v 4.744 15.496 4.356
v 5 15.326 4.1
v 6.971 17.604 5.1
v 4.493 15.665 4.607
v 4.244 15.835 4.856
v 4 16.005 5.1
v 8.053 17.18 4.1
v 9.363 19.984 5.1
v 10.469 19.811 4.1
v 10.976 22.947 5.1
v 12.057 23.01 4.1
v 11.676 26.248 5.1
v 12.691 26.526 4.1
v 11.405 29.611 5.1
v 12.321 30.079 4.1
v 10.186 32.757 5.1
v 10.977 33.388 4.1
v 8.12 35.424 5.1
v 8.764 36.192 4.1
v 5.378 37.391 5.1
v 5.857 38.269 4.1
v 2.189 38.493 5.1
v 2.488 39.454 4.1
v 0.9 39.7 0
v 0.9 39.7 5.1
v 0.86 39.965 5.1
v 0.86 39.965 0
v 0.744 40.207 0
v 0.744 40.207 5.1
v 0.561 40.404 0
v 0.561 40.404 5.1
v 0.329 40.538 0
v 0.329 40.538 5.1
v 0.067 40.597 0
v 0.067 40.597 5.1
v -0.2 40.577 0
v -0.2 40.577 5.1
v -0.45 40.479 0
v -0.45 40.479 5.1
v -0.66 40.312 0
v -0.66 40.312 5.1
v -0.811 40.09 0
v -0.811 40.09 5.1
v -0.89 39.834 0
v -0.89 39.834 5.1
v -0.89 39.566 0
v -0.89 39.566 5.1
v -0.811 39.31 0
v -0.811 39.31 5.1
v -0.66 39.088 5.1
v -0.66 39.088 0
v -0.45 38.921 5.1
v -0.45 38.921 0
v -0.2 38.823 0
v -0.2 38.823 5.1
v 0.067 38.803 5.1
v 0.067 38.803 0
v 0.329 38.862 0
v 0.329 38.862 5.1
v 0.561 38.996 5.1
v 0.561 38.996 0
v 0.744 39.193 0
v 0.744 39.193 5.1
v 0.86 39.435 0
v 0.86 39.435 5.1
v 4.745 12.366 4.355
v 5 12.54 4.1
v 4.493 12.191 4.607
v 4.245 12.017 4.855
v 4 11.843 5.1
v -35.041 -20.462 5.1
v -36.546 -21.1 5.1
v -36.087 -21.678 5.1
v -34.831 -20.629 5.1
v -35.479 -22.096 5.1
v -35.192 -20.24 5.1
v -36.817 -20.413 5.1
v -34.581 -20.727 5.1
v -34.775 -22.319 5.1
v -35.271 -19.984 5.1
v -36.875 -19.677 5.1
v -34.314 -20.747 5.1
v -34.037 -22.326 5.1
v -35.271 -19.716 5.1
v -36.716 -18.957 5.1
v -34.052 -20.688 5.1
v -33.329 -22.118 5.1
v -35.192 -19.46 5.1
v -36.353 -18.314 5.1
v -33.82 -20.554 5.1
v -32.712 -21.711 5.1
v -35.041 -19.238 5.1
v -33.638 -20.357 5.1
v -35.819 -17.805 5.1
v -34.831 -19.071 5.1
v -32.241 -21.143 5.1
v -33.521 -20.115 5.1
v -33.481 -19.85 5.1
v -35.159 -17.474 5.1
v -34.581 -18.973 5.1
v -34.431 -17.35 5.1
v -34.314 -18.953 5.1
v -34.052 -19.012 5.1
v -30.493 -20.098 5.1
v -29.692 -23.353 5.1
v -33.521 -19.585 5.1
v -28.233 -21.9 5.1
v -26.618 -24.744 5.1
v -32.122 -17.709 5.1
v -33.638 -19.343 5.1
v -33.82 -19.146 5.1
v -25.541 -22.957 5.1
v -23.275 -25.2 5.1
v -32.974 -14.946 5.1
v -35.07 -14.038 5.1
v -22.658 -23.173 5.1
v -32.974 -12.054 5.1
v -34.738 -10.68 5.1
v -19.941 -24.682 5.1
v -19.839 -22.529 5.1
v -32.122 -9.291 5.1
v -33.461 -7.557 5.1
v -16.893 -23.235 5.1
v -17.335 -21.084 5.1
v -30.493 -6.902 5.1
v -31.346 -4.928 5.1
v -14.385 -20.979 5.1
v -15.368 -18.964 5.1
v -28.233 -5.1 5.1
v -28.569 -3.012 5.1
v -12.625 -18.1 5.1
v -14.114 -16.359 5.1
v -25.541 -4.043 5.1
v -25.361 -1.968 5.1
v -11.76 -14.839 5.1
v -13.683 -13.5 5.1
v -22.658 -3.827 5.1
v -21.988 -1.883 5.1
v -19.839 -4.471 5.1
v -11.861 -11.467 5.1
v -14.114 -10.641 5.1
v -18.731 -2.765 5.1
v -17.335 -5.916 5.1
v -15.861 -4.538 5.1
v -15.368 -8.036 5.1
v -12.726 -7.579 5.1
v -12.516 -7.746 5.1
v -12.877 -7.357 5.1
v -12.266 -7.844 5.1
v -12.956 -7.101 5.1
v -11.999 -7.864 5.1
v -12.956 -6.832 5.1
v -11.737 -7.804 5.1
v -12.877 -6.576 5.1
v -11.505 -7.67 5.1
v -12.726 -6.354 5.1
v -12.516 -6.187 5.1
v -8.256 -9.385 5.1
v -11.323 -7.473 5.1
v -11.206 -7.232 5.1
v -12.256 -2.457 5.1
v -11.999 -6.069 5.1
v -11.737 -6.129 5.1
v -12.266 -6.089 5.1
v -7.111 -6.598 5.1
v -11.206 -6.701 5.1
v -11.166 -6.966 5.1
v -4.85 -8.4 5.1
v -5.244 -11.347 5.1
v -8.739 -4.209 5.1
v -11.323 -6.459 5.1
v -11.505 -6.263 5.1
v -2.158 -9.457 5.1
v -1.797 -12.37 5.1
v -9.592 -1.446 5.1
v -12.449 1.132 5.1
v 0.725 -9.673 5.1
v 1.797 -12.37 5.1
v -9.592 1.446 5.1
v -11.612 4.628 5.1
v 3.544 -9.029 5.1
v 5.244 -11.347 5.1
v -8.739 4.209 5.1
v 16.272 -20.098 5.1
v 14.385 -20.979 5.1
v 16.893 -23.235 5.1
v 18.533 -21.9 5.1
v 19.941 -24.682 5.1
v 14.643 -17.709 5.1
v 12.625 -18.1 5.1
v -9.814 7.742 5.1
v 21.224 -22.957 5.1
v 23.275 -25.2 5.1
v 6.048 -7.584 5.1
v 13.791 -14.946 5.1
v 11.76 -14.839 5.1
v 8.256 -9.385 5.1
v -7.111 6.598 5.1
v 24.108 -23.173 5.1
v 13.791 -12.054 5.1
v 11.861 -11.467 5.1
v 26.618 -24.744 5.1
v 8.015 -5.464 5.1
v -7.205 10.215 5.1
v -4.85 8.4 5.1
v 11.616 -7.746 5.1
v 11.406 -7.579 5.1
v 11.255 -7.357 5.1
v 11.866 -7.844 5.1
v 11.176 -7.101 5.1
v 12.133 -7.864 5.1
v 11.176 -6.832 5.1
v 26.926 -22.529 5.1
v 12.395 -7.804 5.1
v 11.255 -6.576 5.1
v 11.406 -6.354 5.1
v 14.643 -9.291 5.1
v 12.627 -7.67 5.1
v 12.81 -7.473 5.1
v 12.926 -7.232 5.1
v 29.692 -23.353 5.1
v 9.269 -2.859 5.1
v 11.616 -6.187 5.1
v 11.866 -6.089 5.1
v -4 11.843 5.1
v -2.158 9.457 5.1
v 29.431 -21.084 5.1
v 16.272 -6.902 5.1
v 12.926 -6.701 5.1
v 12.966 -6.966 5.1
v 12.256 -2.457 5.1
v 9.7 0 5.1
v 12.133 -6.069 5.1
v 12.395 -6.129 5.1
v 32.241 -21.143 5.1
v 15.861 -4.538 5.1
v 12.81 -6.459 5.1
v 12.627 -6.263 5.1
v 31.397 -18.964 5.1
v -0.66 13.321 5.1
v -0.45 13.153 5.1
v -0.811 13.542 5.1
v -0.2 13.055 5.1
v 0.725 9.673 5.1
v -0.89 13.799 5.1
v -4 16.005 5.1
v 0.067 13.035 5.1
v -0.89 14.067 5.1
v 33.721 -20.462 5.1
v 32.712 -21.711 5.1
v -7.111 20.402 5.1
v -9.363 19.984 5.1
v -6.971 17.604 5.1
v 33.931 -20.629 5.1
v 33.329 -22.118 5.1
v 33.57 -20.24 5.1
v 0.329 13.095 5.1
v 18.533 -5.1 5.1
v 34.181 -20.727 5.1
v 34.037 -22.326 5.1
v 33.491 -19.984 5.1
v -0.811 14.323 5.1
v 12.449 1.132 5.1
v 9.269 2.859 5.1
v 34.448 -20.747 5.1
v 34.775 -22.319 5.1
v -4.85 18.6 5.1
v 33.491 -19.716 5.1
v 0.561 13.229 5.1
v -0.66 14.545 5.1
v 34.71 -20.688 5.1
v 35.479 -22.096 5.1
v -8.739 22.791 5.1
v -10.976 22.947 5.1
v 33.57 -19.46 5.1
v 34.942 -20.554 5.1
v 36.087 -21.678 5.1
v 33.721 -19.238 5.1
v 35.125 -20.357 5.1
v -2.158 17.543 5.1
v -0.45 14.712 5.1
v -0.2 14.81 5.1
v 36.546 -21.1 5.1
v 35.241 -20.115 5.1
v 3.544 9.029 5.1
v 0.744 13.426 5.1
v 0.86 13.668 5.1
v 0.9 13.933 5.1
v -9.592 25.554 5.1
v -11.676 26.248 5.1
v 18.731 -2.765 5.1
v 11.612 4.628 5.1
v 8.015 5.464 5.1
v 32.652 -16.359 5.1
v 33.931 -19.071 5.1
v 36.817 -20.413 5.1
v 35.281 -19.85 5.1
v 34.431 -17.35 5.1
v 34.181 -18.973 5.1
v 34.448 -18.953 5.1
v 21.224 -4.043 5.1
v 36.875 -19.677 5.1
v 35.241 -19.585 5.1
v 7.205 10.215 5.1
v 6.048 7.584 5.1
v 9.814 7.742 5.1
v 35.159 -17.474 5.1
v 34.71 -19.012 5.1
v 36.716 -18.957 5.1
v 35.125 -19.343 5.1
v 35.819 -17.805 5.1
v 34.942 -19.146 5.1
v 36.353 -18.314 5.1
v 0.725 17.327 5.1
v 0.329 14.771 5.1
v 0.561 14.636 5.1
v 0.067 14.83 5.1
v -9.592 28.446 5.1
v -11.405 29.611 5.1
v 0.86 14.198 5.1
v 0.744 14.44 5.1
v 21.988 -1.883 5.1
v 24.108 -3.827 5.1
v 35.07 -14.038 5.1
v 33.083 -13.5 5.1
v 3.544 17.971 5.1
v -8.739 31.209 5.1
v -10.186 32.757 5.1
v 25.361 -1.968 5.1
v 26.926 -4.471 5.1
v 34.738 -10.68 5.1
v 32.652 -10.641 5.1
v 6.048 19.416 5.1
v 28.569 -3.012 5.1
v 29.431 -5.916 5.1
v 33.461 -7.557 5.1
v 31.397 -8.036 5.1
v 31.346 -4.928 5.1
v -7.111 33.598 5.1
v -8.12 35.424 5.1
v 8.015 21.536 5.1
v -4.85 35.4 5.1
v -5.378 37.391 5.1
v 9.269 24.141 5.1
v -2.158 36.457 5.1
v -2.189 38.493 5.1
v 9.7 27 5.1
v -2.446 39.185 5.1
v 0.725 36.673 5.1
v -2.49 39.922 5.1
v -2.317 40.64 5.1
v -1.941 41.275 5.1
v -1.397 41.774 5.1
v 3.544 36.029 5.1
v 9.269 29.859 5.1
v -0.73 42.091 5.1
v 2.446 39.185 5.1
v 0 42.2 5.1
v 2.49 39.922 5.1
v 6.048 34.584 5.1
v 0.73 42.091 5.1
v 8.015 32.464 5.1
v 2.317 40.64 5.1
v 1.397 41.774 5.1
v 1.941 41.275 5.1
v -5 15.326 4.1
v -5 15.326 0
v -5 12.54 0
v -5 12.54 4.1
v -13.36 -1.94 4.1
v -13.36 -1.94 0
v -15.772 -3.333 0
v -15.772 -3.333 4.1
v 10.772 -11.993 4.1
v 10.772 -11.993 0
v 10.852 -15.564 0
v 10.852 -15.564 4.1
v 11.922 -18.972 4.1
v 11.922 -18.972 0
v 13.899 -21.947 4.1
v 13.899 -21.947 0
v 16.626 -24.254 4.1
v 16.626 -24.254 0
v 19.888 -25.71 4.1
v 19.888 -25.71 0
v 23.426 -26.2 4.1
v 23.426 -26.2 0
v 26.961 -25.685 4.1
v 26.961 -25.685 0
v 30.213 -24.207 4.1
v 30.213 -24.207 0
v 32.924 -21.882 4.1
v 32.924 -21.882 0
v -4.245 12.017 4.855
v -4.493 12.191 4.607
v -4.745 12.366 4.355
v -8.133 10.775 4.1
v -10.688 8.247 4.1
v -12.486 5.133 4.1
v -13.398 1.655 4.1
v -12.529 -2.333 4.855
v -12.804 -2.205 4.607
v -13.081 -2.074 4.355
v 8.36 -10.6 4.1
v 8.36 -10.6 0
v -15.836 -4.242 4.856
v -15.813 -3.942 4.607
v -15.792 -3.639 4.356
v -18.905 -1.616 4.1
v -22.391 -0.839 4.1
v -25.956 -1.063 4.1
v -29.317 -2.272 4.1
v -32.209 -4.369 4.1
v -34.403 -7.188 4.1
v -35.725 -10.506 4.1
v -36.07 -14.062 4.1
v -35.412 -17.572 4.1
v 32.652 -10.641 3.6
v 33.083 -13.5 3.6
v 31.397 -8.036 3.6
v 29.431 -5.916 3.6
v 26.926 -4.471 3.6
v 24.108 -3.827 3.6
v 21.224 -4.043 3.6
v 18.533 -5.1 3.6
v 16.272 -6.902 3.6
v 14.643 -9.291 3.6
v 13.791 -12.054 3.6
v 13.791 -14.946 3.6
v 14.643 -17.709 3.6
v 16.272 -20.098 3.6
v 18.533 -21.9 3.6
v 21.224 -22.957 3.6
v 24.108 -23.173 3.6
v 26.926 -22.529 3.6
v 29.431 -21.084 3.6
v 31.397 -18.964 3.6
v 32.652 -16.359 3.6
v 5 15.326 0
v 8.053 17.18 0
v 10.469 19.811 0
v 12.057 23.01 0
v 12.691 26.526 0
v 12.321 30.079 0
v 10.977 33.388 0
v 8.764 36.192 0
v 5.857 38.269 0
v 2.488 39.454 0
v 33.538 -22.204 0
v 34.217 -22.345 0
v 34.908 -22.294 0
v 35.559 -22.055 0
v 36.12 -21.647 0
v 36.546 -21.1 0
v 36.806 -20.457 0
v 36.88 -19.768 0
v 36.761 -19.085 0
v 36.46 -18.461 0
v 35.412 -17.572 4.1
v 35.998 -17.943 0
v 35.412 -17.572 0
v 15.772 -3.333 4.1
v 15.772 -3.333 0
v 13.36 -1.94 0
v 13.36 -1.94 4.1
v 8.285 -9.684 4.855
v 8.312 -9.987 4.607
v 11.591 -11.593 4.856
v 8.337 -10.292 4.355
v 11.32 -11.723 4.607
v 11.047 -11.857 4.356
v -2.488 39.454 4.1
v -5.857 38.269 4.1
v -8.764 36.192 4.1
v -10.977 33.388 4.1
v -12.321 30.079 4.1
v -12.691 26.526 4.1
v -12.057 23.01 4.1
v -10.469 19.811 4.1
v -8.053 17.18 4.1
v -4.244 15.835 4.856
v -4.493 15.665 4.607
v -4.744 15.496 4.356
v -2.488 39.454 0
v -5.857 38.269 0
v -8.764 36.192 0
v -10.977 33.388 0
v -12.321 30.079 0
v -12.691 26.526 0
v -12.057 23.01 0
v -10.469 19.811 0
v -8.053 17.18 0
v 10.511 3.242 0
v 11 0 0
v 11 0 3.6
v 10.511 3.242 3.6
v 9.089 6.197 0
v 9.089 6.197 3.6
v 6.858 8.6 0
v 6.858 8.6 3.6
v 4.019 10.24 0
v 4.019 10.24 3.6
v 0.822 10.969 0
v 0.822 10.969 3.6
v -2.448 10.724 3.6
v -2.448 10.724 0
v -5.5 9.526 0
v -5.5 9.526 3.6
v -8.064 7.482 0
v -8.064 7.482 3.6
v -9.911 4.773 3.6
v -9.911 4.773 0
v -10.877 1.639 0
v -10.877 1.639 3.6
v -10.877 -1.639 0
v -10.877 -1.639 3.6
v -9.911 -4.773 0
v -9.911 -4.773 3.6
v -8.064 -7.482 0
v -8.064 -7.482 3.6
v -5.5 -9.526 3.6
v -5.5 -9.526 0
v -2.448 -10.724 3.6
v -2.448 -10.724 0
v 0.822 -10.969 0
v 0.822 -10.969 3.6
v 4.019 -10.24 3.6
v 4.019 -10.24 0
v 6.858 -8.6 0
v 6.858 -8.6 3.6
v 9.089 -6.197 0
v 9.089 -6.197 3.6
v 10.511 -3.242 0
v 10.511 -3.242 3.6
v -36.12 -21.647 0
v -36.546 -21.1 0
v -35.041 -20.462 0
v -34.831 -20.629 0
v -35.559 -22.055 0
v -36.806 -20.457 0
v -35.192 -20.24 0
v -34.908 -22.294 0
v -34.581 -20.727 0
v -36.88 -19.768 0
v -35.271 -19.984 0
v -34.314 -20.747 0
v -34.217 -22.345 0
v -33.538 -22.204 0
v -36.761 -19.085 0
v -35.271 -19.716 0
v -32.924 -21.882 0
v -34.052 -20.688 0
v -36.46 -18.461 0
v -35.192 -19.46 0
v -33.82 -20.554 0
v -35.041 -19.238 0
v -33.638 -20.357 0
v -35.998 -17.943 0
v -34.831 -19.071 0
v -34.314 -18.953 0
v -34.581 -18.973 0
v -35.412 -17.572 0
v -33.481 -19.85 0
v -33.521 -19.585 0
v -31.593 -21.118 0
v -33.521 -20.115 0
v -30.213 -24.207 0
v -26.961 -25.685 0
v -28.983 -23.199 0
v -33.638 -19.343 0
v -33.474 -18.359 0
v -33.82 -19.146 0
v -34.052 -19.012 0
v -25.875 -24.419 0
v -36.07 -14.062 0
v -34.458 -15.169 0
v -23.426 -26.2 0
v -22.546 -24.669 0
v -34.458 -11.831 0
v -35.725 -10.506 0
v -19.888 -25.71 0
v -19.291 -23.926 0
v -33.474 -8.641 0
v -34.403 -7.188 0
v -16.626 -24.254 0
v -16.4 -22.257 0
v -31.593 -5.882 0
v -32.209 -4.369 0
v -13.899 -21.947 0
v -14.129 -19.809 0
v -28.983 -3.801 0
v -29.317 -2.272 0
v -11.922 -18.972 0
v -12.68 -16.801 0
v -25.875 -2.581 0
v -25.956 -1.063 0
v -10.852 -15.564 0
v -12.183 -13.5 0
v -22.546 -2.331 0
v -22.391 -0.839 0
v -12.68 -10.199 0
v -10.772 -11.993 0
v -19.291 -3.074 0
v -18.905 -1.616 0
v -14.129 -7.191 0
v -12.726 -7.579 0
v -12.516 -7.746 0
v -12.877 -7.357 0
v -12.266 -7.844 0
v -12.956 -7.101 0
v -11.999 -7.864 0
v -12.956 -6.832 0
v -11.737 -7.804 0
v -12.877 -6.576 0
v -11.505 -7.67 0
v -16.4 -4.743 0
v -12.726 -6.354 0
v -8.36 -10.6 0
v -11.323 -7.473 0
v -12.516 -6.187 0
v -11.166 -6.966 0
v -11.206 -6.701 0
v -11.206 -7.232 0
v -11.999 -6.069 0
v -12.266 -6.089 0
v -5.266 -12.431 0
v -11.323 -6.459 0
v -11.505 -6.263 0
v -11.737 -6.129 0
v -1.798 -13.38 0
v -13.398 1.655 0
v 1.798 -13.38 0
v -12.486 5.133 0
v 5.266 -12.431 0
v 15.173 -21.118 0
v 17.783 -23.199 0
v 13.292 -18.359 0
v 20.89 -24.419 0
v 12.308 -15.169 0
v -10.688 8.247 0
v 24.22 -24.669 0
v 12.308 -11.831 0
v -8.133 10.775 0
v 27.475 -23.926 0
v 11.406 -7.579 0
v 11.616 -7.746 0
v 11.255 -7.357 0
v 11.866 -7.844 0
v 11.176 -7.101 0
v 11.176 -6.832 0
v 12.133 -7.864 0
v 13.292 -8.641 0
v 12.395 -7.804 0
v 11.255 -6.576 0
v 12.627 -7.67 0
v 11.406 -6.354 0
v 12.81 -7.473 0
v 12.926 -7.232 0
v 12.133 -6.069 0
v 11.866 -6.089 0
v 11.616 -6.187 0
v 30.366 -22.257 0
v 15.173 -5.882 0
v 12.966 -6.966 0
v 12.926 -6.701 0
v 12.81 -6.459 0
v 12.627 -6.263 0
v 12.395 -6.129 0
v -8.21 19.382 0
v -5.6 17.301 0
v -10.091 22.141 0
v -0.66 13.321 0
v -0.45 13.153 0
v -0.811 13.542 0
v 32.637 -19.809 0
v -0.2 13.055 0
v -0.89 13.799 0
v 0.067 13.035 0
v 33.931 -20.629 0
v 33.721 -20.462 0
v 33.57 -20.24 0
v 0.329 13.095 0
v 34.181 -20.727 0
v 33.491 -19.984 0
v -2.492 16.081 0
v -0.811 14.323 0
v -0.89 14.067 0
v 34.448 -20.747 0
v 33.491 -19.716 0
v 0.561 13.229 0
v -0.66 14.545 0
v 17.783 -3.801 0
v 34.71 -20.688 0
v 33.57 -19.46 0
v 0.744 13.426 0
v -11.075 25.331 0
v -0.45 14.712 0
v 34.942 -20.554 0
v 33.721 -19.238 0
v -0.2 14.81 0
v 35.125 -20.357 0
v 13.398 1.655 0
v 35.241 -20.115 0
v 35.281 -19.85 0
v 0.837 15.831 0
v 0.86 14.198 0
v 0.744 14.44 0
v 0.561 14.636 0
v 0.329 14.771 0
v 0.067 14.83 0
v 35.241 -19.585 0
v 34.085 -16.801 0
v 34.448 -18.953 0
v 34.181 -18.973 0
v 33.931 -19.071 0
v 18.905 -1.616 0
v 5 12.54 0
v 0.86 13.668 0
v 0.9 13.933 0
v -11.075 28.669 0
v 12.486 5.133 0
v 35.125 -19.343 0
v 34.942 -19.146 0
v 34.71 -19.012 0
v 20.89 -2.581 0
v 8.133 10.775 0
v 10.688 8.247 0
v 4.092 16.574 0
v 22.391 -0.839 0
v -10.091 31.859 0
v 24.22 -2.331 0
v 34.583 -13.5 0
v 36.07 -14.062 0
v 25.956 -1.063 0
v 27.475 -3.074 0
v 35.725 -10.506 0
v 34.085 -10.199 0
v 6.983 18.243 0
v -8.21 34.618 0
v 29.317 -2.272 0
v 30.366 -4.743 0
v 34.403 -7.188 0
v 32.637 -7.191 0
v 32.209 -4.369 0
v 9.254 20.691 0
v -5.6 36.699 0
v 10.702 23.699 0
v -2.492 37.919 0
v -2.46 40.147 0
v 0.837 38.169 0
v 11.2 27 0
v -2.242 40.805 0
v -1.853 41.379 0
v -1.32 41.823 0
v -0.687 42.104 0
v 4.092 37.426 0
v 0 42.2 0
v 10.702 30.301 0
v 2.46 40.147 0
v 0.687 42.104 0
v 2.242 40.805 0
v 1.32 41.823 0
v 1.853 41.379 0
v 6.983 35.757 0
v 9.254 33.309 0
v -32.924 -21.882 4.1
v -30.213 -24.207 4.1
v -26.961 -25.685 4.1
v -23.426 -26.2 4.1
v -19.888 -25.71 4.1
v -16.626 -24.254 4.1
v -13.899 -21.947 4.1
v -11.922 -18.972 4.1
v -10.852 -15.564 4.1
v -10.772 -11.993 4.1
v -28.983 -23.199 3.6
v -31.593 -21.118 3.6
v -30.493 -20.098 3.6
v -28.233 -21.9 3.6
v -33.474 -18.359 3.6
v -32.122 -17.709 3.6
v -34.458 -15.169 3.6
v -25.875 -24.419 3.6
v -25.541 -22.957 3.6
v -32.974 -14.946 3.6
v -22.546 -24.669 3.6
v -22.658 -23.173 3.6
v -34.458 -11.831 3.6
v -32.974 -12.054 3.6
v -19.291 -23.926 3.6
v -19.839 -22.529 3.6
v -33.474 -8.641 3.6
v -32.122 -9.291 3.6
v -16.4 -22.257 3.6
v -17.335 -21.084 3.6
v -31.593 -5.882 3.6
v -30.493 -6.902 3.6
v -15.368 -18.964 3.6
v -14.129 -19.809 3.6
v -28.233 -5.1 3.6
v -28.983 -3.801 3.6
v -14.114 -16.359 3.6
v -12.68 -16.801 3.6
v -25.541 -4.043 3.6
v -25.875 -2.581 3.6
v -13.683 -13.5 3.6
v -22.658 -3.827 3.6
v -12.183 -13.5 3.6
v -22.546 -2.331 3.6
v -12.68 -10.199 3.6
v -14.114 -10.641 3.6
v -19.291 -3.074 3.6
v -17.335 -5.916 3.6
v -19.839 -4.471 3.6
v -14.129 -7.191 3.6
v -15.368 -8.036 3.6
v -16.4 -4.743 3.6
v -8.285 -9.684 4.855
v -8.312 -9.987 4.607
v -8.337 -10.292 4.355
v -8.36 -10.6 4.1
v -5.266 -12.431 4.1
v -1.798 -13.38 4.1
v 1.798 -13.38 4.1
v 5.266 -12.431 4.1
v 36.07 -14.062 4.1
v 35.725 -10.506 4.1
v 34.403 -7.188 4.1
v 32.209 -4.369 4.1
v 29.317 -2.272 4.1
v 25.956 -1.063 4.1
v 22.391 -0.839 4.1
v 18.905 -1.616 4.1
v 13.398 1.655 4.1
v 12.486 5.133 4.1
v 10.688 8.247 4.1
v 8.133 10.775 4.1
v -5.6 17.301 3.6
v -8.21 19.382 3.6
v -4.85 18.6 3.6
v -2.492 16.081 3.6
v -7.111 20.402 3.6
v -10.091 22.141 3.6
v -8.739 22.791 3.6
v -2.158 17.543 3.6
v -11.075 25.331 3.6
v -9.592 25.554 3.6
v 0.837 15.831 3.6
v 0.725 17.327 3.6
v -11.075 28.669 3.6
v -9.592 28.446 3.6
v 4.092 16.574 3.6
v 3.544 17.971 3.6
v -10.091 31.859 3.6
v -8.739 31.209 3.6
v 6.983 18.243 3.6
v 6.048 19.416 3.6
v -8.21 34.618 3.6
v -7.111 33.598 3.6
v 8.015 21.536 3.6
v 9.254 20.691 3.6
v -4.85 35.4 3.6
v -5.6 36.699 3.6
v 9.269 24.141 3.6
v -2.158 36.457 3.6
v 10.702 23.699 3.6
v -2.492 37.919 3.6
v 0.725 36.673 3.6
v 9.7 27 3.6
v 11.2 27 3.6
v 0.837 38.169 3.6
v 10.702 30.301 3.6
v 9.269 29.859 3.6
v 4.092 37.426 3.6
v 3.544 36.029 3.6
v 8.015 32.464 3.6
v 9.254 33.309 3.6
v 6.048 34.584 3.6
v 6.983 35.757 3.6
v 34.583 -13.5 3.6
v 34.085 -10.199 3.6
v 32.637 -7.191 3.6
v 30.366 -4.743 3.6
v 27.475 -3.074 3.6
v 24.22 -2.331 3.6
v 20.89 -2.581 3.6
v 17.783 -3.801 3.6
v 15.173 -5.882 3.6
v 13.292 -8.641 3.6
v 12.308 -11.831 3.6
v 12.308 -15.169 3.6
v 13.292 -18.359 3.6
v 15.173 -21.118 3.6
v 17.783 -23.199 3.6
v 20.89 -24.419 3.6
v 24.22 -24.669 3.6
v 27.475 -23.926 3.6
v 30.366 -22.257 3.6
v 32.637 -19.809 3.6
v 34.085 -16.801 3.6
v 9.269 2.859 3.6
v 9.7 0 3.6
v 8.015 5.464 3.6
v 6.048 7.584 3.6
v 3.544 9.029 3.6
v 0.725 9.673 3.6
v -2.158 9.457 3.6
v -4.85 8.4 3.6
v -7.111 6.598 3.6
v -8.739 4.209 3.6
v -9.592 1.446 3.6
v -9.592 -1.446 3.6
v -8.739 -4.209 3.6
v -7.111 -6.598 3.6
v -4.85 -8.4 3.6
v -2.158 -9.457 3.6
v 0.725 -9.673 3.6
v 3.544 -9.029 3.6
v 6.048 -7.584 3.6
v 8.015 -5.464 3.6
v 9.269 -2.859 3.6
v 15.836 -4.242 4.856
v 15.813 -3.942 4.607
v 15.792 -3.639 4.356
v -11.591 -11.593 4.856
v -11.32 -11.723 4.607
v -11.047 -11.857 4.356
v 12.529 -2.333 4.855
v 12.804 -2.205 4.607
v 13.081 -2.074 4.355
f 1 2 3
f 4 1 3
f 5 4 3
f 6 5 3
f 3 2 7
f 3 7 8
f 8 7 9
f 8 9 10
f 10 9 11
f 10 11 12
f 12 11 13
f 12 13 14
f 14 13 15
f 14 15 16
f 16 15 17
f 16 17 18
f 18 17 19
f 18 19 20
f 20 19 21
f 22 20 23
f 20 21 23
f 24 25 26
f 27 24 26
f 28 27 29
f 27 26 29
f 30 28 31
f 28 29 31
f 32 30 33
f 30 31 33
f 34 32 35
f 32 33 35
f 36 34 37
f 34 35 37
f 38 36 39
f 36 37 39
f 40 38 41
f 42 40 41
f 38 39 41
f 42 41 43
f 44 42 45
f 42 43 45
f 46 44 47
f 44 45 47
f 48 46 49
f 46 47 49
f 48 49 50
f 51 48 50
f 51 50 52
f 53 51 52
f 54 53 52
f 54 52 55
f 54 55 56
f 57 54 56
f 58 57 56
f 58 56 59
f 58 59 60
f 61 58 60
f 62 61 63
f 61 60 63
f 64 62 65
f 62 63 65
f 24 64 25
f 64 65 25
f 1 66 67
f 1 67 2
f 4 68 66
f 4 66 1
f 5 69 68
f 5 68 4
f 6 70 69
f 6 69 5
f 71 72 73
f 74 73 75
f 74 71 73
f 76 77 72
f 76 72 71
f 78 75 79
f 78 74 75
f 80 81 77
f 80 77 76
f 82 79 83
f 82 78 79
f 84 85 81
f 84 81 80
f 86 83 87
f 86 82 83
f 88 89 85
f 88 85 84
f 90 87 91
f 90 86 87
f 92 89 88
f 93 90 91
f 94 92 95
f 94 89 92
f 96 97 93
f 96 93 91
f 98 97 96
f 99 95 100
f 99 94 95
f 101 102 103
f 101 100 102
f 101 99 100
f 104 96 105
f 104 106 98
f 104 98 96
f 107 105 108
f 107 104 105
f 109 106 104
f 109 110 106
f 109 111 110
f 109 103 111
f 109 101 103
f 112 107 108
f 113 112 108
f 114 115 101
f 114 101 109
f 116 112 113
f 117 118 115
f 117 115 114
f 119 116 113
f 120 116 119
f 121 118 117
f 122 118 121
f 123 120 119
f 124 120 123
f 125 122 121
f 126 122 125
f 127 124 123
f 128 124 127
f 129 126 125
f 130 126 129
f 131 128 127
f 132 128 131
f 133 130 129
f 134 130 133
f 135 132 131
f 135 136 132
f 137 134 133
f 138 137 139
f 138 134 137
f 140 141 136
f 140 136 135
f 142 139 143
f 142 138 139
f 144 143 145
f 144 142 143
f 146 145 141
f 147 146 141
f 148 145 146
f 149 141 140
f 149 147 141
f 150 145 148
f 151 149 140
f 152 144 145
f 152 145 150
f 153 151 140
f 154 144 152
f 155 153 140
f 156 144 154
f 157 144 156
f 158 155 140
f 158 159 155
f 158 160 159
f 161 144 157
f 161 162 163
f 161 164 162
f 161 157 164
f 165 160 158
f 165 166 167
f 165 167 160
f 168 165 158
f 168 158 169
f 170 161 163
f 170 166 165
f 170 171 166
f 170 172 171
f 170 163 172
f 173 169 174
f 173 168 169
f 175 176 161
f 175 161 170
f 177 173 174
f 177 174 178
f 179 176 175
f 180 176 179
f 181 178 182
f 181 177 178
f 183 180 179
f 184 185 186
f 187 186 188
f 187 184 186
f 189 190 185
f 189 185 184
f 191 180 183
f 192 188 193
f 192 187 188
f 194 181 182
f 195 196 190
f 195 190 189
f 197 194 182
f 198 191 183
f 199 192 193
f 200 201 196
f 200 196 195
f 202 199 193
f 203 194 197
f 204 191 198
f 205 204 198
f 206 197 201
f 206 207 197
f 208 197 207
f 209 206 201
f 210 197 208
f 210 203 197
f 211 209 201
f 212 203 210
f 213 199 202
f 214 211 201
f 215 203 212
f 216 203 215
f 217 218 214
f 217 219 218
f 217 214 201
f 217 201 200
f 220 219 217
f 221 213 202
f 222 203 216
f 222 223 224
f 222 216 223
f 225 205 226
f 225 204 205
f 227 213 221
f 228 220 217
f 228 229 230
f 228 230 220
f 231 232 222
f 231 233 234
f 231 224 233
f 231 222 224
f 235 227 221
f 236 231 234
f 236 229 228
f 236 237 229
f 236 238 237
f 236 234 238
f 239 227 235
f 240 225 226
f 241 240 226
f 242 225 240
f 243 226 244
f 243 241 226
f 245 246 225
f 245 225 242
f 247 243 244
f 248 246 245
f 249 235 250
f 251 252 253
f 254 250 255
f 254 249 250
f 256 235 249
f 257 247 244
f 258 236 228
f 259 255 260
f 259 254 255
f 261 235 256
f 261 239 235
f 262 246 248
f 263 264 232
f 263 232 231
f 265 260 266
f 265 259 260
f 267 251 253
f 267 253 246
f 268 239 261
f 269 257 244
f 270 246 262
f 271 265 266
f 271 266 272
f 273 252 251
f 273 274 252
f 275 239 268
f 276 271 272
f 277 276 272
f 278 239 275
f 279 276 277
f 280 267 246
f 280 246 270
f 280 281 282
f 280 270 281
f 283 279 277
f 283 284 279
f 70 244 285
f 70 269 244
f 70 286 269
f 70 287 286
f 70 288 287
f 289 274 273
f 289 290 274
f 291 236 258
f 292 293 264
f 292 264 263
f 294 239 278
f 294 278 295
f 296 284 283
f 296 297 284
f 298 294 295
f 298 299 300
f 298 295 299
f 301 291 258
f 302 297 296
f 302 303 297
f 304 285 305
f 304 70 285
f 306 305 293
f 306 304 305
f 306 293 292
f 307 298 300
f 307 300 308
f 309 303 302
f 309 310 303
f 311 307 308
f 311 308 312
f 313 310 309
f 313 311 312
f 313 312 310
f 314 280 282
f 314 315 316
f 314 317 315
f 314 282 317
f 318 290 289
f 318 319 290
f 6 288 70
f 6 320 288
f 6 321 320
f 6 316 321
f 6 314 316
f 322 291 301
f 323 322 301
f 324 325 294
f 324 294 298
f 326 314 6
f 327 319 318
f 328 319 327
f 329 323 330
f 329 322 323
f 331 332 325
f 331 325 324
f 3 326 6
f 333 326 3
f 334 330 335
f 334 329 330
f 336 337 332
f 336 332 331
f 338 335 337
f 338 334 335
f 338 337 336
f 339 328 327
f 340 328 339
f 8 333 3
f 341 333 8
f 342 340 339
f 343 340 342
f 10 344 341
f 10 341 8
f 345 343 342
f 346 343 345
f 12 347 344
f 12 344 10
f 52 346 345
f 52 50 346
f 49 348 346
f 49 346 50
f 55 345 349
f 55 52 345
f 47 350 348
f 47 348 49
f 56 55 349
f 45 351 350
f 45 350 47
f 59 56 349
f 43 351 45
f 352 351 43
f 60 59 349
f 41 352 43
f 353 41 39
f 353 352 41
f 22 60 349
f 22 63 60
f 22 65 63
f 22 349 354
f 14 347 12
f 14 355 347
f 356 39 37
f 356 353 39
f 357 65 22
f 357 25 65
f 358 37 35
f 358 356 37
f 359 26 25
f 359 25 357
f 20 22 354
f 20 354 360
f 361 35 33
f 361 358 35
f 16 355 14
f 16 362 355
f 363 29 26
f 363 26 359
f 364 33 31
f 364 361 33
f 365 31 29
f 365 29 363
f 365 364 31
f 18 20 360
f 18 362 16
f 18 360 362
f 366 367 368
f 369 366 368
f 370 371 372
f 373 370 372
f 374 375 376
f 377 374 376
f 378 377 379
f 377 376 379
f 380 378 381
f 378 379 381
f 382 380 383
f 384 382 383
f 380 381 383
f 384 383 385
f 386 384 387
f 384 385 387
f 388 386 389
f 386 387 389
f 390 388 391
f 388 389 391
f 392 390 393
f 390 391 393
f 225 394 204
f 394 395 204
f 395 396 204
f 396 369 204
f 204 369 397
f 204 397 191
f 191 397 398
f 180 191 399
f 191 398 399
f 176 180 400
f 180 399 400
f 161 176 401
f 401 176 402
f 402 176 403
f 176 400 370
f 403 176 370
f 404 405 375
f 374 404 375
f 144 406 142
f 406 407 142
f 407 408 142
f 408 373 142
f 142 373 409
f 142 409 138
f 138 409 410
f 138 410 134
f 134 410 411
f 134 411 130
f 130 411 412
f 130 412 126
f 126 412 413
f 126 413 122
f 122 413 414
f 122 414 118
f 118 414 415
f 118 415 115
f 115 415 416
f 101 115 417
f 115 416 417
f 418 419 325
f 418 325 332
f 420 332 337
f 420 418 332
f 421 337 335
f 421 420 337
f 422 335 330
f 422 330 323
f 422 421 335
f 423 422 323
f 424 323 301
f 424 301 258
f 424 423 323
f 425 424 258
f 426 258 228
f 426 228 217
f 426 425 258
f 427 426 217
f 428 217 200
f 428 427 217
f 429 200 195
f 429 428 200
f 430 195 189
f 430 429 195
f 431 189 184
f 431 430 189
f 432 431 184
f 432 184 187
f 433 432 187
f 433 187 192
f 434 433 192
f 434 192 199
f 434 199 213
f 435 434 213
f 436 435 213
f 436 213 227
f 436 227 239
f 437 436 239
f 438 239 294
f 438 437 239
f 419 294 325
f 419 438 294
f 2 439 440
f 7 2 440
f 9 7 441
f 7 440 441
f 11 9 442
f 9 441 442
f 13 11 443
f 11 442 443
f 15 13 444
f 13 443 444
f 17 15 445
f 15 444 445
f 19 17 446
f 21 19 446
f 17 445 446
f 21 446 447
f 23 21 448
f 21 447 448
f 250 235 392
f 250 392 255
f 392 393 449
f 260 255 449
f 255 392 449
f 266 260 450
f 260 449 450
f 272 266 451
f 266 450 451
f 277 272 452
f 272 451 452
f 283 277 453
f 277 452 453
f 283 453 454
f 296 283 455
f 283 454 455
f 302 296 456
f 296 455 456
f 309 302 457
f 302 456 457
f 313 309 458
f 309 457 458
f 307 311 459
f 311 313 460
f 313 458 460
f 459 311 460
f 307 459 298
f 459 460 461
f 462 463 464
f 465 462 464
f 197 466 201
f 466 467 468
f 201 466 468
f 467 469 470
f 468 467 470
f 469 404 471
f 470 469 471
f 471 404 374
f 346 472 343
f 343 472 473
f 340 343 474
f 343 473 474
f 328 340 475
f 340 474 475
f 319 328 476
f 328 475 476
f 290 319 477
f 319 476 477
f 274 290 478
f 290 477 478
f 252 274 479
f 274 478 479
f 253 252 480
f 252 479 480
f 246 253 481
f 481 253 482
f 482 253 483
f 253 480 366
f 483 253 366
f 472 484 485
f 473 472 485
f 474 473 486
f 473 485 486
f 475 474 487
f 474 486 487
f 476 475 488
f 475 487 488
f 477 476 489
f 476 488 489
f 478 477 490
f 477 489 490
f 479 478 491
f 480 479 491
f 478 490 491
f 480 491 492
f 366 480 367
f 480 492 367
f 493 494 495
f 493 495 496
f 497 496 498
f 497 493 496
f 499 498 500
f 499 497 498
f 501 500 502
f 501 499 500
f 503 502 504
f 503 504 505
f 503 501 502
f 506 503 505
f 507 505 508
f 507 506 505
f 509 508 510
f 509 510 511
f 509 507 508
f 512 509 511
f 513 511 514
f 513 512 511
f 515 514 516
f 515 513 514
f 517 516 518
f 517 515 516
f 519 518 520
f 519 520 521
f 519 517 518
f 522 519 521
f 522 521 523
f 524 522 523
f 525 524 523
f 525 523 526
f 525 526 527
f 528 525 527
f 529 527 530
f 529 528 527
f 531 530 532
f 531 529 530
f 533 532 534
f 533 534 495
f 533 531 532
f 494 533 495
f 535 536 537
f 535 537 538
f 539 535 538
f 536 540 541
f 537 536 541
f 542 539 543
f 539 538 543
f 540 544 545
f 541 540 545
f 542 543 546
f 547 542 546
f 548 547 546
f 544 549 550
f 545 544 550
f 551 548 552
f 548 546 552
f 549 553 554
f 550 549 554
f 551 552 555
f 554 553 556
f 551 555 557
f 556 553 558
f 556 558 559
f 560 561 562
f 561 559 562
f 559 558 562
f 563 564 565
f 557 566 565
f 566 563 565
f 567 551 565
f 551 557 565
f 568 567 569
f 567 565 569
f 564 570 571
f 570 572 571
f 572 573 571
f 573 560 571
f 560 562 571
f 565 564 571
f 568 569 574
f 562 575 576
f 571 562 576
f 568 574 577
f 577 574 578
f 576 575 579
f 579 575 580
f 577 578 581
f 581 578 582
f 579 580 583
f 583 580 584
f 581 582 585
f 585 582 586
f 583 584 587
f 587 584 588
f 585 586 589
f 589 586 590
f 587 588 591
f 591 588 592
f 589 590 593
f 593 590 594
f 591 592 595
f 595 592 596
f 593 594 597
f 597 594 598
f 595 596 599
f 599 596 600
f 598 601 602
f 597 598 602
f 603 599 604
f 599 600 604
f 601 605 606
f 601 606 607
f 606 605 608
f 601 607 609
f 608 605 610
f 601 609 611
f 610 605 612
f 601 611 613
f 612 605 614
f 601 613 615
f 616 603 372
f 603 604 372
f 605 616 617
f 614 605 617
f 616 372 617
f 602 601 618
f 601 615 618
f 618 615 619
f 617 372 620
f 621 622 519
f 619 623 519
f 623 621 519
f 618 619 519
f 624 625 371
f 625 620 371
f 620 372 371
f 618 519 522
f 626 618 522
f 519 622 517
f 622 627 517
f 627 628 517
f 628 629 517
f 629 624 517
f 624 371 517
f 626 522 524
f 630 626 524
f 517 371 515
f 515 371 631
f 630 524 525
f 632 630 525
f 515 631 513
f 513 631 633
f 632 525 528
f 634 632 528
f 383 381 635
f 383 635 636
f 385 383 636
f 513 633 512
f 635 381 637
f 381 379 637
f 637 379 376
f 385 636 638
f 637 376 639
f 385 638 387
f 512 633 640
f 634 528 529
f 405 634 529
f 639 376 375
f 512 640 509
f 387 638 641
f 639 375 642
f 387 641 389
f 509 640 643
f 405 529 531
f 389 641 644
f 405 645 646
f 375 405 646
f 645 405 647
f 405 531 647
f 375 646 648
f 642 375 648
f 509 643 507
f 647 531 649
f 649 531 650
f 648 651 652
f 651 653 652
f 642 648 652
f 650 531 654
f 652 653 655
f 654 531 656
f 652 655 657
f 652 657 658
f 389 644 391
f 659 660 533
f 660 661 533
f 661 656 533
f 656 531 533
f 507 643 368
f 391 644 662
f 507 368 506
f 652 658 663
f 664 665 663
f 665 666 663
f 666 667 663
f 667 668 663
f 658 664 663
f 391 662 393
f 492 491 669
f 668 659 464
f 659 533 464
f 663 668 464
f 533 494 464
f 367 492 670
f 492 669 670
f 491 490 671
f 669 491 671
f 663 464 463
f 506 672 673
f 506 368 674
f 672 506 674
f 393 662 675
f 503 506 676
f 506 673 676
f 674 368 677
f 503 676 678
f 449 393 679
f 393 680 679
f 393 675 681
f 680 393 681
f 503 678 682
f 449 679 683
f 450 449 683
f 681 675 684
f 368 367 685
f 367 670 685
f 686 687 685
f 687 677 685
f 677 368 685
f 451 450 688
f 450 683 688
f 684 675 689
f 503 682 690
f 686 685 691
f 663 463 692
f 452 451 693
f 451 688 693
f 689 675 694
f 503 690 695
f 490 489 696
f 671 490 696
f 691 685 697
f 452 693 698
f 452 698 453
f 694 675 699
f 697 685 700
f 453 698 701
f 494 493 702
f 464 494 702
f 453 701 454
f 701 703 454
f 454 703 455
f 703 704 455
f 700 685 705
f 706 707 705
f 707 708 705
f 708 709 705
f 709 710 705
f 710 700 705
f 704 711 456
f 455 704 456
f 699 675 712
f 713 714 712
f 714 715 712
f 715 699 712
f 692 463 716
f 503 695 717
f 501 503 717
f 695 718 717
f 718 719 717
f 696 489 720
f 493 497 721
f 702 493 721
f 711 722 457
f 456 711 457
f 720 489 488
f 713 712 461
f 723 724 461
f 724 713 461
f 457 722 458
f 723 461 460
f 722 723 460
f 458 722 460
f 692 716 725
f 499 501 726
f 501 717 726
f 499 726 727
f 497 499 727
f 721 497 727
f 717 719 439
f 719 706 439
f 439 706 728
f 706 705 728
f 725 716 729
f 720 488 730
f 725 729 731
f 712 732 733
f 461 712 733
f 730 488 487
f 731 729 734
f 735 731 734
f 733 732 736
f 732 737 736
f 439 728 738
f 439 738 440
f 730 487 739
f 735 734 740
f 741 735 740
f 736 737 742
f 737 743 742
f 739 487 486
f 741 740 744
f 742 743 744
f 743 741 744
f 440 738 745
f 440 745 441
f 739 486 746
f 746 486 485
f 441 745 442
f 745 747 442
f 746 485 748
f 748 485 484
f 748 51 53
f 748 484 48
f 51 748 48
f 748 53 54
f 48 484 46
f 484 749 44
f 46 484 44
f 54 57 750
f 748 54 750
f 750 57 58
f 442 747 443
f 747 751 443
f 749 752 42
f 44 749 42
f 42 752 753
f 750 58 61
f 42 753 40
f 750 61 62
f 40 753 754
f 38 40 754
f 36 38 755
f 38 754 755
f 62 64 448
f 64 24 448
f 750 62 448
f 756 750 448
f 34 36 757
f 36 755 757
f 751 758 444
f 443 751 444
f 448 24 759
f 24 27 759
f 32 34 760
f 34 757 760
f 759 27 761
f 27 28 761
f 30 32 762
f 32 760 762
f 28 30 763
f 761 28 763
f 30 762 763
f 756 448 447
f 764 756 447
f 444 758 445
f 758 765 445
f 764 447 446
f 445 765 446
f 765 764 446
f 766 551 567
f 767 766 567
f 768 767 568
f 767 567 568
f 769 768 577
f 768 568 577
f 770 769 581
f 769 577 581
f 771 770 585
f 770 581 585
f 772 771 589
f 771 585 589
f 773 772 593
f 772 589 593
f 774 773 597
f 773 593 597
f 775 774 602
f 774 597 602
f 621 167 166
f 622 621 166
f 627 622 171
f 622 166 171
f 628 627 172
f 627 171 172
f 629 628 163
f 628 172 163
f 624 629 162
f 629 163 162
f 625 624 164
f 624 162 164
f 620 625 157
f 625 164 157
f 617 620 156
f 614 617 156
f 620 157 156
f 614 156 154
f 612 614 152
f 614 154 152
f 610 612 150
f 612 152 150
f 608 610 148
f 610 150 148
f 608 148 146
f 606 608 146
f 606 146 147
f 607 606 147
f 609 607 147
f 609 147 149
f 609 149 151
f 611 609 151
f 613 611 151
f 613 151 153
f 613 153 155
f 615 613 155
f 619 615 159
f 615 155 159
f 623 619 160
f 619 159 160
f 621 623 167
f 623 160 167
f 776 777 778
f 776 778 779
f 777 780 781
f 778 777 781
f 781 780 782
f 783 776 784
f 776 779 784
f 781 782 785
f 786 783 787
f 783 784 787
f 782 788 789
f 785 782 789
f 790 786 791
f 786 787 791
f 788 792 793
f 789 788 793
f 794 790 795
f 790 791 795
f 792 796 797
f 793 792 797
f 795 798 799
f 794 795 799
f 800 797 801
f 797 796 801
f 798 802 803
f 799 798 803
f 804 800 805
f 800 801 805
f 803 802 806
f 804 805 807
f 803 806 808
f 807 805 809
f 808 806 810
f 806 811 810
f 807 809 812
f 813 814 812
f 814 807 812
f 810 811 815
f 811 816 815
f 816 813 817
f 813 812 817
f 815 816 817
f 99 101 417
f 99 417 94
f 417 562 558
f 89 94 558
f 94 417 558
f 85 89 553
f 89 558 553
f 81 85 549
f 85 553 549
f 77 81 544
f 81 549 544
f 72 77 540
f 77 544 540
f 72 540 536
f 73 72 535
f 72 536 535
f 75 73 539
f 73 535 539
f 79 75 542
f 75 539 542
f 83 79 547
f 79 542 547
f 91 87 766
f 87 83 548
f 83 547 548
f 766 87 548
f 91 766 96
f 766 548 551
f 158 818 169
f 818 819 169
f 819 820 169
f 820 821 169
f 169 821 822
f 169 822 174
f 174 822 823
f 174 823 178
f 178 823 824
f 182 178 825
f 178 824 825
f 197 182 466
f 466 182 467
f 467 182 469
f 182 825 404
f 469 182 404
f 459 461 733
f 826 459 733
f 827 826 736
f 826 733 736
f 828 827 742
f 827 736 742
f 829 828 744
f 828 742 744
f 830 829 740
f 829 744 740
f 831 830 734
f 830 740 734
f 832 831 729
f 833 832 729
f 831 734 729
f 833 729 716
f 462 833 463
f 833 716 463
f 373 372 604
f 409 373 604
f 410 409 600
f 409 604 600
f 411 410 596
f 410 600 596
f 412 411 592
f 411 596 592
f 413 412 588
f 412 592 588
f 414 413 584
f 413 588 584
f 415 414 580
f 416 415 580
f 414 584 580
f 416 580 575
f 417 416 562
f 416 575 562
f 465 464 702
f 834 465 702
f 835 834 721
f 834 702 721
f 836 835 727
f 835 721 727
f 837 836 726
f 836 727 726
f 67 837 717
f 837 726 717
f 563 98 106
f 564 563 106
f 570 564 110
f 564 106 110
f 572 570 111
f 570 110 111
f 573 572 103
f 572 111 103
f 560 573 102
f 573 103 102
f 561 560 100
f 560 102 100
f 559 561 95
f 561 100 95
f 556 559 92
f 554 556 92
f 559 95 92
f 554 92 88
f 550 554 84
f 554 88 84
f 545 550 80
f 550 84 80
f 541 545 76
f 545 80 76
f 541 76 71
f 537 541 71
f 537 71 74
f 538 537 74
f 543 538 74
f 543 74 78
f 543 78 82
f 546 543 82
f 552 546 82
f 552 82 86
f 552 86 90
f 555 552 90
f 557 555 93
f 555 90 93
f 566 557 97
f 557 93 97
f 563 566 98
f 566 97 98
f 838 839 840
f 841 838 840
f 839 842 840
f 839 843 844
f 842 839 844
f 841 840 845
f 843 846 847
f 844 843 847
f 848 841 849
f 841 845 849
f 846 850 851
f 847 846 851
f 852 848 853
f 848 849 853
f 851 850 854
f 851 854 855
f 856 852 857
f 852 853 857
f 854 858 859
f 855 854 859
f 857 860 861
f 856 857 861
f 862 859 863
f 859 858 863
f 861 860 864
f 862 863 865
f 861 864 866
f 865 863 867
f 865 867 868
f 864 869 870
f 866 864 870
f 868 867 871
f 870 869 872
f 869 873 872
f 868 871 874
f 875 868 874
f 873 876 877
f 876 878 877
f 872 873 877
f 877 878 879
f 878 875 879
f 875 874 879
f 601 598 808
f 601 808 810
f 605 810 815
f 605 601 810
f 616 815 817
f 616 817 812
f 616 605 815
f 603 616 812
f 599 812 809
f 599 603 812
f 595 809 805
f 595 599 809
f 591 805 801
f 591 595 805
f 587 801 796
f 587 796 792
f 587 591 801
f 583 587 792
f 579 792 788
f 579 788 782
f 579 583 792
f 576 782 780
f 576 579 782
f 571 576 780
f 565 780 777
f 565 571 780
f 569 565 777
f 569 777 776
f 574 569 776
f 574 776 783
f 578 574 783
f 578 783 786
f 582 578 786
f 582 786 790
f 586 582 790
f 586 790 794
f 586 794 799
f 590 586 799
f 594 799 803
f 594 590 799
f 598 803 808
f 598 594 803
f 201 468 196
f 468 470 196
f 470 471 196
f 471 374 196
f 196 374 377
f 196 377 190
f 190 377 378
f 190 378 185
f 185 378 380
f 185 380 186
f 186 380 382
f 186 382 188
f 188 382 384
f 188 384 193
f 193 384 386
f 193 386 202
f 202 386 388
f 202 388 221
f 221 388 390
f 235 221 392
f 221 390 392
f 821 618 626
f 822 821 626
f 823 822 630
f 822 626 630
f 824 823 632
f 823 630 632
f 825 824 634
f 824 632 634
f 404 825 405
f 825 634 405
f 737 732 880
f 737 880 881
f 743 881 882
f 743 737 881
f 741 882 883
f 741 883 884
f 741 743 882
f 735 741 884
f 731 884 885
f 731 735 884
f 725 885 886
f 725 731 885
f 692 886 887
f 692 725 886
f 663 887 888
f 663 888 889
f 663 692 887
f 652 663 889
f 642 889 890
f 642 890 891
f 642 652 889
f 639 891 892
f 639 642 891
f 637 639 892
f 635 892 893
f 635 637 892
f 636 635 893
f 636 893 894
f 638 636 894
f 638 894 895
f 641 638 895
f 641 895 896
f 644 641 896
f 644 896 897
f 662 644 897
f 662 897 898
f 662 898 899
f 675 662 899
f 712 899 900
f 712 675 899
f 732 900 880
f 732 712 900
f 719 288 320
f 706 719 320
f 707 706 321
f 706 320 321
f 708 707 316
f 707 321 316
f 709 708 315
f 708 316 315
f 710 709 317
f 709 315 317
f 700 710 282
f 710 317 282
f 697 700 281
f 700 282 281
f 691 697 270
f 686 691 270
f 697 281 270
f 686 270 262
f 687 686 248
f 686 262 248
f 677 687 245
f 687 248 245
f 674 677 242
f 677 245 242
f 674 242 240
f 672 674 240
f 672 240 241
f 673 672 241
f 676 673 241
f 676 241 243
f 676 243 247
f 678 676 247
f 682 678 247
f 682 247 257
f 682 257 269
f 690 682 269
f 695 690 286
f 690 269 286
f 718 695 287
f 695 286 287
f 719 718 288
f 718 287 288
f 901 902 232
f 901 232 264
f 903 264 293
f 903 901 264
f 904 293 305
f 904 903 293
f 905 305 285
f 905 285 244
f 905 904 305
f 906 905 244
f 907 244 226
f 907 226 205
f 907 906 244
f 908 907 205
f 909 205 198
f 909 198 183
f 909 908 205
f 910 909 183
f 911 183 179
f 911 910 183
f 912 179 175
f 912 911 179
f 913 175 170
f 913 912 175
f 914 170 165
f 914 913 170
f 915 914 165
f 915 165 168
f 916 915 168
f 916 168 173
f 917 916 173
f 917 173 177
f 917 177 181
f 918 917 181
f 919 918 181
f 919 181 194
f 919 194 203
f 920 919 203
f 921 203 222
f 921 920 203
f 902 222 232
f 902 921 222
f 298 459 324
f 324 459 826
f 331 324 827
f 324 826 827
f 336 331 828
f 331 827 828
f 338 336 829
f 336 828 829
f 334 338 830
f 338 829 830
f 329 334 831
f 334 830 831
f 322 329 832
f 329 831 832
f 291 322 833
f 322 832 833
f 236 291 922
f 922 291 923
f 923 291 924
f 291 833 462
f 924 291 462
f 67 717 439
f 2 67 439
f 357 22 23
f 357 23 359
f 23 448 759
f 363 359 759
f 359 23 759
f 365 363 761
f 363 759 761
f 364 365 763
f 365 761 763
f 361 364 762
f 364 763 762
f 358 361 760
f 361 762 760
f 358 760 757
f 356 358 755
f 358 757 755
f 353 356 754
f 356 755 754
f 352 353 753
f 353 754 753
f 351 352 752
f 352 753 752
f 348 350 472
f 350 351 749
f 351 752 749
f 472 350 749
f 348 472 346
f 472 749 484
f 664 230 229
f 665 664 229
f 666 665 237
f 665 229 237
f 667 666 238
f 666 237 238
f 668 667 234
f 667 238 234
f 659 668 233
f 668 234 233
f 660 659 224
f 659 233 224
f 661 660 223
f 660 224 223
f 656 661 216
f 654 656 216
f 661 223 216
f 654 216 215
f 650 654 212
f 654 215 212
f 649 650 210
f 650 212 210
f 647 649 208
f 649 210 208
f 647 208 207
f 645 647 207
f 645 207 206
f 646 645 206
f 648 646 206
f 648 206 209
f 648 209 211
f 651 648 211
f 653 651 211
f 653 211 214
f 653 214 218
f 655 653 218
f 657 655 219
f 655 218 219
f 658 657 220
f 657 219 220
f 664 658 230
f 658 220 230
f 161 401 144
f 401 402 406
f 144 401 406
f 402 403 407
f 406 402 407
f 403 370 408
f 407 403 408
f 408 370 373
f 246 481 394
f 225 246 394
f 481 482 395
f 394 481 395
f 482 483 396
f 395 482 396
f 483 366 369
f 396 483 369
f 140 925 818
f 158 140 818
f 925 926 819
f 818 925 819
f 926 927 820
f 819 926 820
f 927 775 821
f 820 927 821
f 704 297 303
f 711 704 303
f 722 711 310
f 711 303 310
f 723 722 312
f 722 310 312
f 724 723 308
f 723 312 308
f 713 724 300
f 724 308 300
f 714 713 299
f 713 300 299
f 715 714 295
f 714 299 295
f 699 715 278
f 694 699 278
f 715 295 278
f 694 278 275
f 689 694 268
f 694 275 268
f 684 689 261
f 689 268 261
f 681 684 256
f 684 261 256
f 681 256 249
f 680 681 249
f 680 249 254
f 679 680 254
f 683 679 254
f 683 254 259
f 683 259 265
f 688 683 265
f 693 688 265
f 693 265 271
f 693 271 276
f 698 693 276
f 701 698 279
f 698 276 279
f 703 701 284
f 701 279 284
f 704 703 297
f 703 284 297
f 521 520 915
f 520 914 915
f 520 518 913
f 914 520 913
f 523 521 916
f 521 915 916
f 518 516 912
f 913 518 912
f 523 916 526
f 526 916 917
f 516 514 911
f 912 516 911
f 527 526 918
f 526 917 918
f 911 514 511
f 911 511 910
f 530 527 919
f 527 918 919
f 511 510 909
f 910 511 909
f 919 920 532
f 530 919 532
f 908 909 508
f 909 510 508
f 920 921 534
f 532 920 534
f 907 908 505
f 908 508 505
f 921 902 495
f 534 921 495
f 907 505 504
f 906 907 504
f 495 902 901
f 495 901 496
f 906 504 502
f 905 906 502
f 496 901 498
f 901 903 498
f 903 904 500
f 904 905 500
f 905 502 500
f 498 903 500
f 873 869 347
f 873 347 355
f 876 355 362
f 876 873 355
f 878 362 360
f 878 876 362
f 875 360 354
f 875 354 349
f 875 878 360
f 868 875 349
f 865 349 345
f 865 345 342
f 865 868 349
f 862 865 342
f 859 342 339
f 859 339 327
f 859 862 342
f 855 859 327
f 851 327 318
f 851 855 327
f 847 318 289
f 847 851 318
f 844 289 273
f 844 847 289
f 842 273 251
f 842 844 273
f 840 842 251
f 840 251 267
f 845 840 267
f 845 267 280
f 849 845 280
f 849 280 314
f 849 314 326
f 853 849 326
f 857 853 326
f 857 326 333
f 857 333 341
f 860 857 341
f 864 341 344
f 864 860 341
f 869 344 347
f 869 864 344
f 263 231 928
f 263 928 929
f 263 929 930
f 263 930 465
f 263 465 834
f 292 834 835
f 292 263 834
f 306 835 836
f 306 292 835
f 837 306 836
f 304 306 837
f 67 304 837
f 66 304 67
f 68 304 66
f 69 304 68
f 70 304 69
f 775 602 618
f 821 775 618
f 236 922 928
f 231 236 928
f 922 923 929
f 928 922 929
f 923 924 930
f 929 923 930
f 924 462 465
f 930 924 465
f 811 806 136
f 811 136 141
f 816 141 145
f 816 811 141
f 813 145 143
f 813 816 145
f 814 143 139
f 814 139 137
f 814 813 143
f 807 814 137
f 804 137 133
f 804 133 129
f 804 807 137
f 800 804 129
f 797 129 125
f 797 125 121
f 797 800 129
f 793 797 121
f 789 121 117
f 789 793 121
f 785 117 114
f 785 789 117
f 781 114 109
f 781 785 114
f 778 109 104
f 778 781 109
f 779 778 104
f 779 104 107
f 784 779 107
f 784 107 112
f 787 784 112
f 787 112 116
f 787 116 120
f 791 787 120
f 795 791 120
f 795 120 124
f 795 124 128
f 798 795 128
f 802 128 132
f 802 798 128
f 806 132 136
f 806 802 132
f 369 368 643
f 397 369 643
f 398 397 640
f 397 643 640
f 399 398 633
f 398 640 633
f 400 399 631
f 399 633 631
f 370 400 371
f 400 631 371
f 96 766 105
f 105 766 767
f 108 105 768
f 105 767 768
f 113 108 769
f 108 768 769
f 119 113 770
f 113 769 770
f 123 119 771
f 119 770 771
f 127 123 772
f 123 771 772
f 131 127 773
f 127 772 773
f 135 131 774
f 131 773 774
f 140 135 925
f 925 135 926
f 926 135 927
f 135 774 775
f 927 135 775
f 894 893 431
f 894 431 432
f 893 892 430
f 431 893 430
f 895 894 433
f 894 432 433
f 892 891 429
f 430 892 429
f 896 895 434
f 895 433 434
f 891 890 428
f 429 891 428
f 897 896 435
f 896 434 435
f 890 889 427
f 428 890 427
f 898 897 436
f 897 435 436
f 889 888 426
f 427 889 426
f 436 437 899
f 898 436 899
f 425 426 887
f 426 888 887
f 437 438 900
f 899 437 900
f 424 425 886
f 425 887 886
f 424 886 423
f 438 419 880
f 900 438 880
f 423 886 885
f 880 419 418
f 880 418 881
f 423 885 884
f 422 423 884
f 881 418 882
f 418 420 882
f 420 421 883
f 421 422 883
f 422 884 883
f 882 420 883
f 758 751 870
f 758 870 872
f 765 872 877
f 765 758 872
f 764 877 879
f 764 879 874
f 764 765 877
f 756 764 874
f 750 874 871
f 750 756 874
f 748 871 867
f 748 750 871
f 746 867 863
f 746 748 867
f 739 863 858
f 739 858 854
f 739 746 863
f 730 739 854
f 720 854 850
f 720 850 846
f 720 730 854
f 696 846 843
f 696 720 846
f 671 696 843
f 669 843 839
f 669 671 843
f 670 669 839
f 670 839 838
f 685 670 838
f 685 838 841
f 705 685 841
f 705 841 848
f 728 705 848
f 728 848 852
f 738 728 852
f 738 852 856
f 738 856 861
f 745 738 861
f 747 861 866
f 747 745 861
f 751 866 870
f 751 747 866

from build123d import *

# Parameters (mm, degrees)
F0_R     = 11
F0_R_2   = 11.2
F1_DEPTH = 3.6
F2_R     = 11.2
F2_R_2   = 11
F2_R_3   = 9.7
F3_DEPTH = 1.5
F5_R     = 0.9
F6_DEPTH = 5.1
F7_SIZE  = 1


with BuildPart() as f1:
    # F0 (on Top) → F1 (new body)
    with BuildSketch(Plane.XY):
        with BuildLine():
            ThreePointArc((-2.4878611303, 39.4539370079), (-12.6317197215, 28.3151642022), (-5, 15.3256691841))
            Line((-5, 15.3256691841), (-5, 12.539936204))
            ThreePointArc((-5, 12.539936204), (-11.6913429511, 6.75), (-13.3599033145, -1.9398410831))
            ThreePointArc((-13.3599033145, -1.9398410831), (-11.6913429511, -6.75), (-8.3599033145, -10.6000951209))
            ThreePointArc((-8.3599033145, -10.6000951209), (0, -13.5), (8.3599033145, -10.6000951209))
            ThreePointArc((8.3599033145, -10.6000951209), (11.6913429511, -6.75), (13.3599033145, -1.9398410831))
            ThreePointArc((13.3599033145, -1.9398410831), (11.6913429511, 6.75), (5, 12.539936204))
            Line((5, 12.539936204), (5, 15.3256691841))
            ThreePointArc((5, 15.3256691841), (12.6317197215, 28.3151642022), (2.4878611303, 39.4539370079))
            ThreePointArc((2.4878611303, 39.4539370079), (0, 42.2), (-2.4878611303, 39.4539370079))
        make_face()
        Circle(F0_R, mode=Mode.SUBTRACT)
        with Locations((0, 27)):
            Circle(F0_R_2, mode=Mode.SUBTRACT)
        with BuildLine():
            ThreePointArc((-8.3599033145, -10.6000951209), (-11.6913429511, -6.75), (-13.3599033145, -1.9398410831))
            Line((-13.3599033145, -1.9398410831), (-15.7724188434, -3.3327075731))
            ThreePointArc((-15.7724188434, -3.3327075731), (-30.8375113722, -3.2181919288), (-35.4120422933, -17.572417564))
            ThreePointArc((-35.4120422933, -17.572417564), (-36.5462720397, -21.1), (-32.924181163, -21.8815194439))
            ThreePointArc((-32.924181163, -21.8815194439), (-18.2057916507, -25.0969722734), (-10.7724188434, -11.992961611))
            Line((-10.7724188434, -11.992961611), (-8.3599033145, -10.6000951209))
        make_face()
        with Locations((-23.3826859022, -13.5)):
            Circle(F0_R_2, mode=Mode.SUBTRACT)
        with BuildLine():
            ThreePointArc((13.3599033145, -1.9398410831), (11.6913429511, -6.75), (8.3599033145, -10.6000951209))
            Line((8.3599033145, -10.6000951209), (10.7724188434, -11.992961611))
            ThreePointArc((10.7724188434, -11.992961611), (18.2057916507, -25.0969722734), (32.924181163, -21.8815194439))
            ThreePointArc((32.924181163, -21.8815194439), (36.5462720397, -21.1), (35.4120422933, -17.572417564))
            ThreePointArc((35.4120422933, -17.572417564), (30.8375113722, -3.2181919288), (15.7724188434, -3.3327075731))
            Line((15.7724188434, -3.3327075731), (13.3599033145, -1.9398410831))
        make_face()
        with Locations((23.3826859022, -13.5)):
            Circle(F0_R_2, mode=Mode.SUBTRACT)
    extrude(amount=F1_DEPTH)

    # F2 (on face) → F3 (join)
    with BuildSketch(Plane.XY.offset(3.6)):
        with BuildLine():
            Line((5, 12.539936204), (5, 15.3256691841))
            ThreePointArc((5, 15.3256691841), (12.6317197215, 28.3151642022), (2.4878611303, 39.4539370079))
            ThreePointArc((2.4878611303, 39.4539370079), (0, 42.2), (-2.4878611303, 39.4539370079))
            ThreePointArc((-2.4878611303, 39.4539370079), (-12.6317197215, 28.3151642022), (-5, 15.3256691841))
            Line((-5, 15.3256691841), (-5, 12.539936204))
            ThreePointArc((-5, 12.539936204), (-11.6913429511, 6.75), (-13.3599033145, -1.9398410831))
            Line((-13.3599033145, -1.9398410831), (-15.7724188434, -3.3327075731))
            ThreePointArc((-15.7724188434, -3.3327075731), (-30.8375113722, -3.2181919288), (-35.4120422933, -17.572417564))
            ThreePointArc((-35.4120422933, -17.572417564), (-36.5462720397, -21.1), (-32.924181163, -21.8815194439))
            ThreePointArc((-32.924181163, -21.8815194439), (-18.2057916507, -25.0969722734), (-10.7724188434, -11.992961611))
            Line((-10.7724188434, -11.992961611), (-8.3599033145, -10.6000951209))
            ThreePointArc((-8.3599033145, -10.6000951209), (0, -13.5), (8.3599033145, -10.6000951209))
            Line((8.3599033145, -10.6000951209), (10.7724188434, -11.992961611))
            ThreePointArc((10.7724188434, -11.992961611), (18.2057916507, -25.0969722734), (32.924181163, -21.8815194439))
            ThreePointArc((32.924181163, -21.8815194439), (36.5462720397, -21.1), (35.4120422933, -17.572417564))
            ThreePointArc((35.4120422933, -17.572417564), (30.8375113722, -3.2181919288), (15.7724188434, -3.3327075731))
            Line((15.7724188434, -3.3327075731), (13.3599033145, -1.9398410831))
            ThreePointArc((13.3599033145, -1.9398410831), (11.6913429511, 6.75), (5, 12.539936204))
        make_face()
        with Locations((-23.3826859022, -13.5)):
            Circle(F2_R, mode=Mode.SUBTRACT)
        with Locations((23.3826859022, -13.5)):
            Circle(F2_R, mode=Mode.SUBTRACT)
        Circle(F2_R_2, mode=Mode.SUBTRACT)
        with Locations((0, 27)):
            Circle(F2_R, mode=Mode.SUBTRACT)
        with Locations((0, 27)):
            Circle(F2_R)
        with Locations((0, 27)):
            Circle(F2_R_3, mode=Mode.SUBTRACT)
        with Locations((-23.3826859022, -13.5)):
            Circle(F2_R)
        with Locations((-23.3826859022, -13.5)):
            Circle(F2_R_3, mode=Mode.SUBTRACT)
        with Locations((23.3826859022, -13.5)):
            Circle(F2_R)
        with Locations((23.3826859022, -13.5)):
            Circle(F2_R_3, mode=Mode.SUBTRACT)
        Circle(F2_R_2)
        Circle(F2_R_3, mode=Mode.SUBTRACT)
    extrude(amount=F3_DEPTH)

    # F5 (on face) → F6 (cut, through all)
    with BuildSketch(Plane.XY.offset(5.1)):
        with Locations((0, 39.7)):
            Circle(F5_R)
        with Locations((0, 13.932802694)):
            Circle(F5_R)
        with Locations((-12.0661610789, -6.966401347)):
            Circle(F5_R)
        with Locations((-34.3812085302, -19.85)):
            Circle(F5_R)
        with Locations((12.0661610789, -6.966401347)):
            Circle(F5_R)
        with Locations((34.3812085302, -19.85)):
            Circle(F5_R)
    extrude(amount=-F6_DEPTH, mode=Mode.SUBTRACT)

    # F7
    f7_edges = [f1.edges().sort_by_distance(p)[0] for p in [
        (-18.205792, -25.096972, 5.1),
        (-9.566161, -11.296528, 5.1),
        (0, -13.5, 5.1),
        (9.566161, -11.296528, 5.1),
        (18.205792, -25.096972, 5.1),
        (30.837511, -3.218192, 5.1),
        (14.566161, -2.636274, 5.1),
        (11.691343, 6.75, 5.1),
        (5, 13.932803, 5.1),
        (12.63172, 28.315164, 5.1),
        (-12.63172, 28.315164, 5.1),
        (-5, 13.932803, 5.1),
        (-11.691343, 6.75, 5.1),
        (-14.566161, -2.636274, 5.1),
        (-30.837511, -3.218192, 5.1),
    ]]
    chamfer(f7_edges, length=F7_SIZE)


solid = f1.part
